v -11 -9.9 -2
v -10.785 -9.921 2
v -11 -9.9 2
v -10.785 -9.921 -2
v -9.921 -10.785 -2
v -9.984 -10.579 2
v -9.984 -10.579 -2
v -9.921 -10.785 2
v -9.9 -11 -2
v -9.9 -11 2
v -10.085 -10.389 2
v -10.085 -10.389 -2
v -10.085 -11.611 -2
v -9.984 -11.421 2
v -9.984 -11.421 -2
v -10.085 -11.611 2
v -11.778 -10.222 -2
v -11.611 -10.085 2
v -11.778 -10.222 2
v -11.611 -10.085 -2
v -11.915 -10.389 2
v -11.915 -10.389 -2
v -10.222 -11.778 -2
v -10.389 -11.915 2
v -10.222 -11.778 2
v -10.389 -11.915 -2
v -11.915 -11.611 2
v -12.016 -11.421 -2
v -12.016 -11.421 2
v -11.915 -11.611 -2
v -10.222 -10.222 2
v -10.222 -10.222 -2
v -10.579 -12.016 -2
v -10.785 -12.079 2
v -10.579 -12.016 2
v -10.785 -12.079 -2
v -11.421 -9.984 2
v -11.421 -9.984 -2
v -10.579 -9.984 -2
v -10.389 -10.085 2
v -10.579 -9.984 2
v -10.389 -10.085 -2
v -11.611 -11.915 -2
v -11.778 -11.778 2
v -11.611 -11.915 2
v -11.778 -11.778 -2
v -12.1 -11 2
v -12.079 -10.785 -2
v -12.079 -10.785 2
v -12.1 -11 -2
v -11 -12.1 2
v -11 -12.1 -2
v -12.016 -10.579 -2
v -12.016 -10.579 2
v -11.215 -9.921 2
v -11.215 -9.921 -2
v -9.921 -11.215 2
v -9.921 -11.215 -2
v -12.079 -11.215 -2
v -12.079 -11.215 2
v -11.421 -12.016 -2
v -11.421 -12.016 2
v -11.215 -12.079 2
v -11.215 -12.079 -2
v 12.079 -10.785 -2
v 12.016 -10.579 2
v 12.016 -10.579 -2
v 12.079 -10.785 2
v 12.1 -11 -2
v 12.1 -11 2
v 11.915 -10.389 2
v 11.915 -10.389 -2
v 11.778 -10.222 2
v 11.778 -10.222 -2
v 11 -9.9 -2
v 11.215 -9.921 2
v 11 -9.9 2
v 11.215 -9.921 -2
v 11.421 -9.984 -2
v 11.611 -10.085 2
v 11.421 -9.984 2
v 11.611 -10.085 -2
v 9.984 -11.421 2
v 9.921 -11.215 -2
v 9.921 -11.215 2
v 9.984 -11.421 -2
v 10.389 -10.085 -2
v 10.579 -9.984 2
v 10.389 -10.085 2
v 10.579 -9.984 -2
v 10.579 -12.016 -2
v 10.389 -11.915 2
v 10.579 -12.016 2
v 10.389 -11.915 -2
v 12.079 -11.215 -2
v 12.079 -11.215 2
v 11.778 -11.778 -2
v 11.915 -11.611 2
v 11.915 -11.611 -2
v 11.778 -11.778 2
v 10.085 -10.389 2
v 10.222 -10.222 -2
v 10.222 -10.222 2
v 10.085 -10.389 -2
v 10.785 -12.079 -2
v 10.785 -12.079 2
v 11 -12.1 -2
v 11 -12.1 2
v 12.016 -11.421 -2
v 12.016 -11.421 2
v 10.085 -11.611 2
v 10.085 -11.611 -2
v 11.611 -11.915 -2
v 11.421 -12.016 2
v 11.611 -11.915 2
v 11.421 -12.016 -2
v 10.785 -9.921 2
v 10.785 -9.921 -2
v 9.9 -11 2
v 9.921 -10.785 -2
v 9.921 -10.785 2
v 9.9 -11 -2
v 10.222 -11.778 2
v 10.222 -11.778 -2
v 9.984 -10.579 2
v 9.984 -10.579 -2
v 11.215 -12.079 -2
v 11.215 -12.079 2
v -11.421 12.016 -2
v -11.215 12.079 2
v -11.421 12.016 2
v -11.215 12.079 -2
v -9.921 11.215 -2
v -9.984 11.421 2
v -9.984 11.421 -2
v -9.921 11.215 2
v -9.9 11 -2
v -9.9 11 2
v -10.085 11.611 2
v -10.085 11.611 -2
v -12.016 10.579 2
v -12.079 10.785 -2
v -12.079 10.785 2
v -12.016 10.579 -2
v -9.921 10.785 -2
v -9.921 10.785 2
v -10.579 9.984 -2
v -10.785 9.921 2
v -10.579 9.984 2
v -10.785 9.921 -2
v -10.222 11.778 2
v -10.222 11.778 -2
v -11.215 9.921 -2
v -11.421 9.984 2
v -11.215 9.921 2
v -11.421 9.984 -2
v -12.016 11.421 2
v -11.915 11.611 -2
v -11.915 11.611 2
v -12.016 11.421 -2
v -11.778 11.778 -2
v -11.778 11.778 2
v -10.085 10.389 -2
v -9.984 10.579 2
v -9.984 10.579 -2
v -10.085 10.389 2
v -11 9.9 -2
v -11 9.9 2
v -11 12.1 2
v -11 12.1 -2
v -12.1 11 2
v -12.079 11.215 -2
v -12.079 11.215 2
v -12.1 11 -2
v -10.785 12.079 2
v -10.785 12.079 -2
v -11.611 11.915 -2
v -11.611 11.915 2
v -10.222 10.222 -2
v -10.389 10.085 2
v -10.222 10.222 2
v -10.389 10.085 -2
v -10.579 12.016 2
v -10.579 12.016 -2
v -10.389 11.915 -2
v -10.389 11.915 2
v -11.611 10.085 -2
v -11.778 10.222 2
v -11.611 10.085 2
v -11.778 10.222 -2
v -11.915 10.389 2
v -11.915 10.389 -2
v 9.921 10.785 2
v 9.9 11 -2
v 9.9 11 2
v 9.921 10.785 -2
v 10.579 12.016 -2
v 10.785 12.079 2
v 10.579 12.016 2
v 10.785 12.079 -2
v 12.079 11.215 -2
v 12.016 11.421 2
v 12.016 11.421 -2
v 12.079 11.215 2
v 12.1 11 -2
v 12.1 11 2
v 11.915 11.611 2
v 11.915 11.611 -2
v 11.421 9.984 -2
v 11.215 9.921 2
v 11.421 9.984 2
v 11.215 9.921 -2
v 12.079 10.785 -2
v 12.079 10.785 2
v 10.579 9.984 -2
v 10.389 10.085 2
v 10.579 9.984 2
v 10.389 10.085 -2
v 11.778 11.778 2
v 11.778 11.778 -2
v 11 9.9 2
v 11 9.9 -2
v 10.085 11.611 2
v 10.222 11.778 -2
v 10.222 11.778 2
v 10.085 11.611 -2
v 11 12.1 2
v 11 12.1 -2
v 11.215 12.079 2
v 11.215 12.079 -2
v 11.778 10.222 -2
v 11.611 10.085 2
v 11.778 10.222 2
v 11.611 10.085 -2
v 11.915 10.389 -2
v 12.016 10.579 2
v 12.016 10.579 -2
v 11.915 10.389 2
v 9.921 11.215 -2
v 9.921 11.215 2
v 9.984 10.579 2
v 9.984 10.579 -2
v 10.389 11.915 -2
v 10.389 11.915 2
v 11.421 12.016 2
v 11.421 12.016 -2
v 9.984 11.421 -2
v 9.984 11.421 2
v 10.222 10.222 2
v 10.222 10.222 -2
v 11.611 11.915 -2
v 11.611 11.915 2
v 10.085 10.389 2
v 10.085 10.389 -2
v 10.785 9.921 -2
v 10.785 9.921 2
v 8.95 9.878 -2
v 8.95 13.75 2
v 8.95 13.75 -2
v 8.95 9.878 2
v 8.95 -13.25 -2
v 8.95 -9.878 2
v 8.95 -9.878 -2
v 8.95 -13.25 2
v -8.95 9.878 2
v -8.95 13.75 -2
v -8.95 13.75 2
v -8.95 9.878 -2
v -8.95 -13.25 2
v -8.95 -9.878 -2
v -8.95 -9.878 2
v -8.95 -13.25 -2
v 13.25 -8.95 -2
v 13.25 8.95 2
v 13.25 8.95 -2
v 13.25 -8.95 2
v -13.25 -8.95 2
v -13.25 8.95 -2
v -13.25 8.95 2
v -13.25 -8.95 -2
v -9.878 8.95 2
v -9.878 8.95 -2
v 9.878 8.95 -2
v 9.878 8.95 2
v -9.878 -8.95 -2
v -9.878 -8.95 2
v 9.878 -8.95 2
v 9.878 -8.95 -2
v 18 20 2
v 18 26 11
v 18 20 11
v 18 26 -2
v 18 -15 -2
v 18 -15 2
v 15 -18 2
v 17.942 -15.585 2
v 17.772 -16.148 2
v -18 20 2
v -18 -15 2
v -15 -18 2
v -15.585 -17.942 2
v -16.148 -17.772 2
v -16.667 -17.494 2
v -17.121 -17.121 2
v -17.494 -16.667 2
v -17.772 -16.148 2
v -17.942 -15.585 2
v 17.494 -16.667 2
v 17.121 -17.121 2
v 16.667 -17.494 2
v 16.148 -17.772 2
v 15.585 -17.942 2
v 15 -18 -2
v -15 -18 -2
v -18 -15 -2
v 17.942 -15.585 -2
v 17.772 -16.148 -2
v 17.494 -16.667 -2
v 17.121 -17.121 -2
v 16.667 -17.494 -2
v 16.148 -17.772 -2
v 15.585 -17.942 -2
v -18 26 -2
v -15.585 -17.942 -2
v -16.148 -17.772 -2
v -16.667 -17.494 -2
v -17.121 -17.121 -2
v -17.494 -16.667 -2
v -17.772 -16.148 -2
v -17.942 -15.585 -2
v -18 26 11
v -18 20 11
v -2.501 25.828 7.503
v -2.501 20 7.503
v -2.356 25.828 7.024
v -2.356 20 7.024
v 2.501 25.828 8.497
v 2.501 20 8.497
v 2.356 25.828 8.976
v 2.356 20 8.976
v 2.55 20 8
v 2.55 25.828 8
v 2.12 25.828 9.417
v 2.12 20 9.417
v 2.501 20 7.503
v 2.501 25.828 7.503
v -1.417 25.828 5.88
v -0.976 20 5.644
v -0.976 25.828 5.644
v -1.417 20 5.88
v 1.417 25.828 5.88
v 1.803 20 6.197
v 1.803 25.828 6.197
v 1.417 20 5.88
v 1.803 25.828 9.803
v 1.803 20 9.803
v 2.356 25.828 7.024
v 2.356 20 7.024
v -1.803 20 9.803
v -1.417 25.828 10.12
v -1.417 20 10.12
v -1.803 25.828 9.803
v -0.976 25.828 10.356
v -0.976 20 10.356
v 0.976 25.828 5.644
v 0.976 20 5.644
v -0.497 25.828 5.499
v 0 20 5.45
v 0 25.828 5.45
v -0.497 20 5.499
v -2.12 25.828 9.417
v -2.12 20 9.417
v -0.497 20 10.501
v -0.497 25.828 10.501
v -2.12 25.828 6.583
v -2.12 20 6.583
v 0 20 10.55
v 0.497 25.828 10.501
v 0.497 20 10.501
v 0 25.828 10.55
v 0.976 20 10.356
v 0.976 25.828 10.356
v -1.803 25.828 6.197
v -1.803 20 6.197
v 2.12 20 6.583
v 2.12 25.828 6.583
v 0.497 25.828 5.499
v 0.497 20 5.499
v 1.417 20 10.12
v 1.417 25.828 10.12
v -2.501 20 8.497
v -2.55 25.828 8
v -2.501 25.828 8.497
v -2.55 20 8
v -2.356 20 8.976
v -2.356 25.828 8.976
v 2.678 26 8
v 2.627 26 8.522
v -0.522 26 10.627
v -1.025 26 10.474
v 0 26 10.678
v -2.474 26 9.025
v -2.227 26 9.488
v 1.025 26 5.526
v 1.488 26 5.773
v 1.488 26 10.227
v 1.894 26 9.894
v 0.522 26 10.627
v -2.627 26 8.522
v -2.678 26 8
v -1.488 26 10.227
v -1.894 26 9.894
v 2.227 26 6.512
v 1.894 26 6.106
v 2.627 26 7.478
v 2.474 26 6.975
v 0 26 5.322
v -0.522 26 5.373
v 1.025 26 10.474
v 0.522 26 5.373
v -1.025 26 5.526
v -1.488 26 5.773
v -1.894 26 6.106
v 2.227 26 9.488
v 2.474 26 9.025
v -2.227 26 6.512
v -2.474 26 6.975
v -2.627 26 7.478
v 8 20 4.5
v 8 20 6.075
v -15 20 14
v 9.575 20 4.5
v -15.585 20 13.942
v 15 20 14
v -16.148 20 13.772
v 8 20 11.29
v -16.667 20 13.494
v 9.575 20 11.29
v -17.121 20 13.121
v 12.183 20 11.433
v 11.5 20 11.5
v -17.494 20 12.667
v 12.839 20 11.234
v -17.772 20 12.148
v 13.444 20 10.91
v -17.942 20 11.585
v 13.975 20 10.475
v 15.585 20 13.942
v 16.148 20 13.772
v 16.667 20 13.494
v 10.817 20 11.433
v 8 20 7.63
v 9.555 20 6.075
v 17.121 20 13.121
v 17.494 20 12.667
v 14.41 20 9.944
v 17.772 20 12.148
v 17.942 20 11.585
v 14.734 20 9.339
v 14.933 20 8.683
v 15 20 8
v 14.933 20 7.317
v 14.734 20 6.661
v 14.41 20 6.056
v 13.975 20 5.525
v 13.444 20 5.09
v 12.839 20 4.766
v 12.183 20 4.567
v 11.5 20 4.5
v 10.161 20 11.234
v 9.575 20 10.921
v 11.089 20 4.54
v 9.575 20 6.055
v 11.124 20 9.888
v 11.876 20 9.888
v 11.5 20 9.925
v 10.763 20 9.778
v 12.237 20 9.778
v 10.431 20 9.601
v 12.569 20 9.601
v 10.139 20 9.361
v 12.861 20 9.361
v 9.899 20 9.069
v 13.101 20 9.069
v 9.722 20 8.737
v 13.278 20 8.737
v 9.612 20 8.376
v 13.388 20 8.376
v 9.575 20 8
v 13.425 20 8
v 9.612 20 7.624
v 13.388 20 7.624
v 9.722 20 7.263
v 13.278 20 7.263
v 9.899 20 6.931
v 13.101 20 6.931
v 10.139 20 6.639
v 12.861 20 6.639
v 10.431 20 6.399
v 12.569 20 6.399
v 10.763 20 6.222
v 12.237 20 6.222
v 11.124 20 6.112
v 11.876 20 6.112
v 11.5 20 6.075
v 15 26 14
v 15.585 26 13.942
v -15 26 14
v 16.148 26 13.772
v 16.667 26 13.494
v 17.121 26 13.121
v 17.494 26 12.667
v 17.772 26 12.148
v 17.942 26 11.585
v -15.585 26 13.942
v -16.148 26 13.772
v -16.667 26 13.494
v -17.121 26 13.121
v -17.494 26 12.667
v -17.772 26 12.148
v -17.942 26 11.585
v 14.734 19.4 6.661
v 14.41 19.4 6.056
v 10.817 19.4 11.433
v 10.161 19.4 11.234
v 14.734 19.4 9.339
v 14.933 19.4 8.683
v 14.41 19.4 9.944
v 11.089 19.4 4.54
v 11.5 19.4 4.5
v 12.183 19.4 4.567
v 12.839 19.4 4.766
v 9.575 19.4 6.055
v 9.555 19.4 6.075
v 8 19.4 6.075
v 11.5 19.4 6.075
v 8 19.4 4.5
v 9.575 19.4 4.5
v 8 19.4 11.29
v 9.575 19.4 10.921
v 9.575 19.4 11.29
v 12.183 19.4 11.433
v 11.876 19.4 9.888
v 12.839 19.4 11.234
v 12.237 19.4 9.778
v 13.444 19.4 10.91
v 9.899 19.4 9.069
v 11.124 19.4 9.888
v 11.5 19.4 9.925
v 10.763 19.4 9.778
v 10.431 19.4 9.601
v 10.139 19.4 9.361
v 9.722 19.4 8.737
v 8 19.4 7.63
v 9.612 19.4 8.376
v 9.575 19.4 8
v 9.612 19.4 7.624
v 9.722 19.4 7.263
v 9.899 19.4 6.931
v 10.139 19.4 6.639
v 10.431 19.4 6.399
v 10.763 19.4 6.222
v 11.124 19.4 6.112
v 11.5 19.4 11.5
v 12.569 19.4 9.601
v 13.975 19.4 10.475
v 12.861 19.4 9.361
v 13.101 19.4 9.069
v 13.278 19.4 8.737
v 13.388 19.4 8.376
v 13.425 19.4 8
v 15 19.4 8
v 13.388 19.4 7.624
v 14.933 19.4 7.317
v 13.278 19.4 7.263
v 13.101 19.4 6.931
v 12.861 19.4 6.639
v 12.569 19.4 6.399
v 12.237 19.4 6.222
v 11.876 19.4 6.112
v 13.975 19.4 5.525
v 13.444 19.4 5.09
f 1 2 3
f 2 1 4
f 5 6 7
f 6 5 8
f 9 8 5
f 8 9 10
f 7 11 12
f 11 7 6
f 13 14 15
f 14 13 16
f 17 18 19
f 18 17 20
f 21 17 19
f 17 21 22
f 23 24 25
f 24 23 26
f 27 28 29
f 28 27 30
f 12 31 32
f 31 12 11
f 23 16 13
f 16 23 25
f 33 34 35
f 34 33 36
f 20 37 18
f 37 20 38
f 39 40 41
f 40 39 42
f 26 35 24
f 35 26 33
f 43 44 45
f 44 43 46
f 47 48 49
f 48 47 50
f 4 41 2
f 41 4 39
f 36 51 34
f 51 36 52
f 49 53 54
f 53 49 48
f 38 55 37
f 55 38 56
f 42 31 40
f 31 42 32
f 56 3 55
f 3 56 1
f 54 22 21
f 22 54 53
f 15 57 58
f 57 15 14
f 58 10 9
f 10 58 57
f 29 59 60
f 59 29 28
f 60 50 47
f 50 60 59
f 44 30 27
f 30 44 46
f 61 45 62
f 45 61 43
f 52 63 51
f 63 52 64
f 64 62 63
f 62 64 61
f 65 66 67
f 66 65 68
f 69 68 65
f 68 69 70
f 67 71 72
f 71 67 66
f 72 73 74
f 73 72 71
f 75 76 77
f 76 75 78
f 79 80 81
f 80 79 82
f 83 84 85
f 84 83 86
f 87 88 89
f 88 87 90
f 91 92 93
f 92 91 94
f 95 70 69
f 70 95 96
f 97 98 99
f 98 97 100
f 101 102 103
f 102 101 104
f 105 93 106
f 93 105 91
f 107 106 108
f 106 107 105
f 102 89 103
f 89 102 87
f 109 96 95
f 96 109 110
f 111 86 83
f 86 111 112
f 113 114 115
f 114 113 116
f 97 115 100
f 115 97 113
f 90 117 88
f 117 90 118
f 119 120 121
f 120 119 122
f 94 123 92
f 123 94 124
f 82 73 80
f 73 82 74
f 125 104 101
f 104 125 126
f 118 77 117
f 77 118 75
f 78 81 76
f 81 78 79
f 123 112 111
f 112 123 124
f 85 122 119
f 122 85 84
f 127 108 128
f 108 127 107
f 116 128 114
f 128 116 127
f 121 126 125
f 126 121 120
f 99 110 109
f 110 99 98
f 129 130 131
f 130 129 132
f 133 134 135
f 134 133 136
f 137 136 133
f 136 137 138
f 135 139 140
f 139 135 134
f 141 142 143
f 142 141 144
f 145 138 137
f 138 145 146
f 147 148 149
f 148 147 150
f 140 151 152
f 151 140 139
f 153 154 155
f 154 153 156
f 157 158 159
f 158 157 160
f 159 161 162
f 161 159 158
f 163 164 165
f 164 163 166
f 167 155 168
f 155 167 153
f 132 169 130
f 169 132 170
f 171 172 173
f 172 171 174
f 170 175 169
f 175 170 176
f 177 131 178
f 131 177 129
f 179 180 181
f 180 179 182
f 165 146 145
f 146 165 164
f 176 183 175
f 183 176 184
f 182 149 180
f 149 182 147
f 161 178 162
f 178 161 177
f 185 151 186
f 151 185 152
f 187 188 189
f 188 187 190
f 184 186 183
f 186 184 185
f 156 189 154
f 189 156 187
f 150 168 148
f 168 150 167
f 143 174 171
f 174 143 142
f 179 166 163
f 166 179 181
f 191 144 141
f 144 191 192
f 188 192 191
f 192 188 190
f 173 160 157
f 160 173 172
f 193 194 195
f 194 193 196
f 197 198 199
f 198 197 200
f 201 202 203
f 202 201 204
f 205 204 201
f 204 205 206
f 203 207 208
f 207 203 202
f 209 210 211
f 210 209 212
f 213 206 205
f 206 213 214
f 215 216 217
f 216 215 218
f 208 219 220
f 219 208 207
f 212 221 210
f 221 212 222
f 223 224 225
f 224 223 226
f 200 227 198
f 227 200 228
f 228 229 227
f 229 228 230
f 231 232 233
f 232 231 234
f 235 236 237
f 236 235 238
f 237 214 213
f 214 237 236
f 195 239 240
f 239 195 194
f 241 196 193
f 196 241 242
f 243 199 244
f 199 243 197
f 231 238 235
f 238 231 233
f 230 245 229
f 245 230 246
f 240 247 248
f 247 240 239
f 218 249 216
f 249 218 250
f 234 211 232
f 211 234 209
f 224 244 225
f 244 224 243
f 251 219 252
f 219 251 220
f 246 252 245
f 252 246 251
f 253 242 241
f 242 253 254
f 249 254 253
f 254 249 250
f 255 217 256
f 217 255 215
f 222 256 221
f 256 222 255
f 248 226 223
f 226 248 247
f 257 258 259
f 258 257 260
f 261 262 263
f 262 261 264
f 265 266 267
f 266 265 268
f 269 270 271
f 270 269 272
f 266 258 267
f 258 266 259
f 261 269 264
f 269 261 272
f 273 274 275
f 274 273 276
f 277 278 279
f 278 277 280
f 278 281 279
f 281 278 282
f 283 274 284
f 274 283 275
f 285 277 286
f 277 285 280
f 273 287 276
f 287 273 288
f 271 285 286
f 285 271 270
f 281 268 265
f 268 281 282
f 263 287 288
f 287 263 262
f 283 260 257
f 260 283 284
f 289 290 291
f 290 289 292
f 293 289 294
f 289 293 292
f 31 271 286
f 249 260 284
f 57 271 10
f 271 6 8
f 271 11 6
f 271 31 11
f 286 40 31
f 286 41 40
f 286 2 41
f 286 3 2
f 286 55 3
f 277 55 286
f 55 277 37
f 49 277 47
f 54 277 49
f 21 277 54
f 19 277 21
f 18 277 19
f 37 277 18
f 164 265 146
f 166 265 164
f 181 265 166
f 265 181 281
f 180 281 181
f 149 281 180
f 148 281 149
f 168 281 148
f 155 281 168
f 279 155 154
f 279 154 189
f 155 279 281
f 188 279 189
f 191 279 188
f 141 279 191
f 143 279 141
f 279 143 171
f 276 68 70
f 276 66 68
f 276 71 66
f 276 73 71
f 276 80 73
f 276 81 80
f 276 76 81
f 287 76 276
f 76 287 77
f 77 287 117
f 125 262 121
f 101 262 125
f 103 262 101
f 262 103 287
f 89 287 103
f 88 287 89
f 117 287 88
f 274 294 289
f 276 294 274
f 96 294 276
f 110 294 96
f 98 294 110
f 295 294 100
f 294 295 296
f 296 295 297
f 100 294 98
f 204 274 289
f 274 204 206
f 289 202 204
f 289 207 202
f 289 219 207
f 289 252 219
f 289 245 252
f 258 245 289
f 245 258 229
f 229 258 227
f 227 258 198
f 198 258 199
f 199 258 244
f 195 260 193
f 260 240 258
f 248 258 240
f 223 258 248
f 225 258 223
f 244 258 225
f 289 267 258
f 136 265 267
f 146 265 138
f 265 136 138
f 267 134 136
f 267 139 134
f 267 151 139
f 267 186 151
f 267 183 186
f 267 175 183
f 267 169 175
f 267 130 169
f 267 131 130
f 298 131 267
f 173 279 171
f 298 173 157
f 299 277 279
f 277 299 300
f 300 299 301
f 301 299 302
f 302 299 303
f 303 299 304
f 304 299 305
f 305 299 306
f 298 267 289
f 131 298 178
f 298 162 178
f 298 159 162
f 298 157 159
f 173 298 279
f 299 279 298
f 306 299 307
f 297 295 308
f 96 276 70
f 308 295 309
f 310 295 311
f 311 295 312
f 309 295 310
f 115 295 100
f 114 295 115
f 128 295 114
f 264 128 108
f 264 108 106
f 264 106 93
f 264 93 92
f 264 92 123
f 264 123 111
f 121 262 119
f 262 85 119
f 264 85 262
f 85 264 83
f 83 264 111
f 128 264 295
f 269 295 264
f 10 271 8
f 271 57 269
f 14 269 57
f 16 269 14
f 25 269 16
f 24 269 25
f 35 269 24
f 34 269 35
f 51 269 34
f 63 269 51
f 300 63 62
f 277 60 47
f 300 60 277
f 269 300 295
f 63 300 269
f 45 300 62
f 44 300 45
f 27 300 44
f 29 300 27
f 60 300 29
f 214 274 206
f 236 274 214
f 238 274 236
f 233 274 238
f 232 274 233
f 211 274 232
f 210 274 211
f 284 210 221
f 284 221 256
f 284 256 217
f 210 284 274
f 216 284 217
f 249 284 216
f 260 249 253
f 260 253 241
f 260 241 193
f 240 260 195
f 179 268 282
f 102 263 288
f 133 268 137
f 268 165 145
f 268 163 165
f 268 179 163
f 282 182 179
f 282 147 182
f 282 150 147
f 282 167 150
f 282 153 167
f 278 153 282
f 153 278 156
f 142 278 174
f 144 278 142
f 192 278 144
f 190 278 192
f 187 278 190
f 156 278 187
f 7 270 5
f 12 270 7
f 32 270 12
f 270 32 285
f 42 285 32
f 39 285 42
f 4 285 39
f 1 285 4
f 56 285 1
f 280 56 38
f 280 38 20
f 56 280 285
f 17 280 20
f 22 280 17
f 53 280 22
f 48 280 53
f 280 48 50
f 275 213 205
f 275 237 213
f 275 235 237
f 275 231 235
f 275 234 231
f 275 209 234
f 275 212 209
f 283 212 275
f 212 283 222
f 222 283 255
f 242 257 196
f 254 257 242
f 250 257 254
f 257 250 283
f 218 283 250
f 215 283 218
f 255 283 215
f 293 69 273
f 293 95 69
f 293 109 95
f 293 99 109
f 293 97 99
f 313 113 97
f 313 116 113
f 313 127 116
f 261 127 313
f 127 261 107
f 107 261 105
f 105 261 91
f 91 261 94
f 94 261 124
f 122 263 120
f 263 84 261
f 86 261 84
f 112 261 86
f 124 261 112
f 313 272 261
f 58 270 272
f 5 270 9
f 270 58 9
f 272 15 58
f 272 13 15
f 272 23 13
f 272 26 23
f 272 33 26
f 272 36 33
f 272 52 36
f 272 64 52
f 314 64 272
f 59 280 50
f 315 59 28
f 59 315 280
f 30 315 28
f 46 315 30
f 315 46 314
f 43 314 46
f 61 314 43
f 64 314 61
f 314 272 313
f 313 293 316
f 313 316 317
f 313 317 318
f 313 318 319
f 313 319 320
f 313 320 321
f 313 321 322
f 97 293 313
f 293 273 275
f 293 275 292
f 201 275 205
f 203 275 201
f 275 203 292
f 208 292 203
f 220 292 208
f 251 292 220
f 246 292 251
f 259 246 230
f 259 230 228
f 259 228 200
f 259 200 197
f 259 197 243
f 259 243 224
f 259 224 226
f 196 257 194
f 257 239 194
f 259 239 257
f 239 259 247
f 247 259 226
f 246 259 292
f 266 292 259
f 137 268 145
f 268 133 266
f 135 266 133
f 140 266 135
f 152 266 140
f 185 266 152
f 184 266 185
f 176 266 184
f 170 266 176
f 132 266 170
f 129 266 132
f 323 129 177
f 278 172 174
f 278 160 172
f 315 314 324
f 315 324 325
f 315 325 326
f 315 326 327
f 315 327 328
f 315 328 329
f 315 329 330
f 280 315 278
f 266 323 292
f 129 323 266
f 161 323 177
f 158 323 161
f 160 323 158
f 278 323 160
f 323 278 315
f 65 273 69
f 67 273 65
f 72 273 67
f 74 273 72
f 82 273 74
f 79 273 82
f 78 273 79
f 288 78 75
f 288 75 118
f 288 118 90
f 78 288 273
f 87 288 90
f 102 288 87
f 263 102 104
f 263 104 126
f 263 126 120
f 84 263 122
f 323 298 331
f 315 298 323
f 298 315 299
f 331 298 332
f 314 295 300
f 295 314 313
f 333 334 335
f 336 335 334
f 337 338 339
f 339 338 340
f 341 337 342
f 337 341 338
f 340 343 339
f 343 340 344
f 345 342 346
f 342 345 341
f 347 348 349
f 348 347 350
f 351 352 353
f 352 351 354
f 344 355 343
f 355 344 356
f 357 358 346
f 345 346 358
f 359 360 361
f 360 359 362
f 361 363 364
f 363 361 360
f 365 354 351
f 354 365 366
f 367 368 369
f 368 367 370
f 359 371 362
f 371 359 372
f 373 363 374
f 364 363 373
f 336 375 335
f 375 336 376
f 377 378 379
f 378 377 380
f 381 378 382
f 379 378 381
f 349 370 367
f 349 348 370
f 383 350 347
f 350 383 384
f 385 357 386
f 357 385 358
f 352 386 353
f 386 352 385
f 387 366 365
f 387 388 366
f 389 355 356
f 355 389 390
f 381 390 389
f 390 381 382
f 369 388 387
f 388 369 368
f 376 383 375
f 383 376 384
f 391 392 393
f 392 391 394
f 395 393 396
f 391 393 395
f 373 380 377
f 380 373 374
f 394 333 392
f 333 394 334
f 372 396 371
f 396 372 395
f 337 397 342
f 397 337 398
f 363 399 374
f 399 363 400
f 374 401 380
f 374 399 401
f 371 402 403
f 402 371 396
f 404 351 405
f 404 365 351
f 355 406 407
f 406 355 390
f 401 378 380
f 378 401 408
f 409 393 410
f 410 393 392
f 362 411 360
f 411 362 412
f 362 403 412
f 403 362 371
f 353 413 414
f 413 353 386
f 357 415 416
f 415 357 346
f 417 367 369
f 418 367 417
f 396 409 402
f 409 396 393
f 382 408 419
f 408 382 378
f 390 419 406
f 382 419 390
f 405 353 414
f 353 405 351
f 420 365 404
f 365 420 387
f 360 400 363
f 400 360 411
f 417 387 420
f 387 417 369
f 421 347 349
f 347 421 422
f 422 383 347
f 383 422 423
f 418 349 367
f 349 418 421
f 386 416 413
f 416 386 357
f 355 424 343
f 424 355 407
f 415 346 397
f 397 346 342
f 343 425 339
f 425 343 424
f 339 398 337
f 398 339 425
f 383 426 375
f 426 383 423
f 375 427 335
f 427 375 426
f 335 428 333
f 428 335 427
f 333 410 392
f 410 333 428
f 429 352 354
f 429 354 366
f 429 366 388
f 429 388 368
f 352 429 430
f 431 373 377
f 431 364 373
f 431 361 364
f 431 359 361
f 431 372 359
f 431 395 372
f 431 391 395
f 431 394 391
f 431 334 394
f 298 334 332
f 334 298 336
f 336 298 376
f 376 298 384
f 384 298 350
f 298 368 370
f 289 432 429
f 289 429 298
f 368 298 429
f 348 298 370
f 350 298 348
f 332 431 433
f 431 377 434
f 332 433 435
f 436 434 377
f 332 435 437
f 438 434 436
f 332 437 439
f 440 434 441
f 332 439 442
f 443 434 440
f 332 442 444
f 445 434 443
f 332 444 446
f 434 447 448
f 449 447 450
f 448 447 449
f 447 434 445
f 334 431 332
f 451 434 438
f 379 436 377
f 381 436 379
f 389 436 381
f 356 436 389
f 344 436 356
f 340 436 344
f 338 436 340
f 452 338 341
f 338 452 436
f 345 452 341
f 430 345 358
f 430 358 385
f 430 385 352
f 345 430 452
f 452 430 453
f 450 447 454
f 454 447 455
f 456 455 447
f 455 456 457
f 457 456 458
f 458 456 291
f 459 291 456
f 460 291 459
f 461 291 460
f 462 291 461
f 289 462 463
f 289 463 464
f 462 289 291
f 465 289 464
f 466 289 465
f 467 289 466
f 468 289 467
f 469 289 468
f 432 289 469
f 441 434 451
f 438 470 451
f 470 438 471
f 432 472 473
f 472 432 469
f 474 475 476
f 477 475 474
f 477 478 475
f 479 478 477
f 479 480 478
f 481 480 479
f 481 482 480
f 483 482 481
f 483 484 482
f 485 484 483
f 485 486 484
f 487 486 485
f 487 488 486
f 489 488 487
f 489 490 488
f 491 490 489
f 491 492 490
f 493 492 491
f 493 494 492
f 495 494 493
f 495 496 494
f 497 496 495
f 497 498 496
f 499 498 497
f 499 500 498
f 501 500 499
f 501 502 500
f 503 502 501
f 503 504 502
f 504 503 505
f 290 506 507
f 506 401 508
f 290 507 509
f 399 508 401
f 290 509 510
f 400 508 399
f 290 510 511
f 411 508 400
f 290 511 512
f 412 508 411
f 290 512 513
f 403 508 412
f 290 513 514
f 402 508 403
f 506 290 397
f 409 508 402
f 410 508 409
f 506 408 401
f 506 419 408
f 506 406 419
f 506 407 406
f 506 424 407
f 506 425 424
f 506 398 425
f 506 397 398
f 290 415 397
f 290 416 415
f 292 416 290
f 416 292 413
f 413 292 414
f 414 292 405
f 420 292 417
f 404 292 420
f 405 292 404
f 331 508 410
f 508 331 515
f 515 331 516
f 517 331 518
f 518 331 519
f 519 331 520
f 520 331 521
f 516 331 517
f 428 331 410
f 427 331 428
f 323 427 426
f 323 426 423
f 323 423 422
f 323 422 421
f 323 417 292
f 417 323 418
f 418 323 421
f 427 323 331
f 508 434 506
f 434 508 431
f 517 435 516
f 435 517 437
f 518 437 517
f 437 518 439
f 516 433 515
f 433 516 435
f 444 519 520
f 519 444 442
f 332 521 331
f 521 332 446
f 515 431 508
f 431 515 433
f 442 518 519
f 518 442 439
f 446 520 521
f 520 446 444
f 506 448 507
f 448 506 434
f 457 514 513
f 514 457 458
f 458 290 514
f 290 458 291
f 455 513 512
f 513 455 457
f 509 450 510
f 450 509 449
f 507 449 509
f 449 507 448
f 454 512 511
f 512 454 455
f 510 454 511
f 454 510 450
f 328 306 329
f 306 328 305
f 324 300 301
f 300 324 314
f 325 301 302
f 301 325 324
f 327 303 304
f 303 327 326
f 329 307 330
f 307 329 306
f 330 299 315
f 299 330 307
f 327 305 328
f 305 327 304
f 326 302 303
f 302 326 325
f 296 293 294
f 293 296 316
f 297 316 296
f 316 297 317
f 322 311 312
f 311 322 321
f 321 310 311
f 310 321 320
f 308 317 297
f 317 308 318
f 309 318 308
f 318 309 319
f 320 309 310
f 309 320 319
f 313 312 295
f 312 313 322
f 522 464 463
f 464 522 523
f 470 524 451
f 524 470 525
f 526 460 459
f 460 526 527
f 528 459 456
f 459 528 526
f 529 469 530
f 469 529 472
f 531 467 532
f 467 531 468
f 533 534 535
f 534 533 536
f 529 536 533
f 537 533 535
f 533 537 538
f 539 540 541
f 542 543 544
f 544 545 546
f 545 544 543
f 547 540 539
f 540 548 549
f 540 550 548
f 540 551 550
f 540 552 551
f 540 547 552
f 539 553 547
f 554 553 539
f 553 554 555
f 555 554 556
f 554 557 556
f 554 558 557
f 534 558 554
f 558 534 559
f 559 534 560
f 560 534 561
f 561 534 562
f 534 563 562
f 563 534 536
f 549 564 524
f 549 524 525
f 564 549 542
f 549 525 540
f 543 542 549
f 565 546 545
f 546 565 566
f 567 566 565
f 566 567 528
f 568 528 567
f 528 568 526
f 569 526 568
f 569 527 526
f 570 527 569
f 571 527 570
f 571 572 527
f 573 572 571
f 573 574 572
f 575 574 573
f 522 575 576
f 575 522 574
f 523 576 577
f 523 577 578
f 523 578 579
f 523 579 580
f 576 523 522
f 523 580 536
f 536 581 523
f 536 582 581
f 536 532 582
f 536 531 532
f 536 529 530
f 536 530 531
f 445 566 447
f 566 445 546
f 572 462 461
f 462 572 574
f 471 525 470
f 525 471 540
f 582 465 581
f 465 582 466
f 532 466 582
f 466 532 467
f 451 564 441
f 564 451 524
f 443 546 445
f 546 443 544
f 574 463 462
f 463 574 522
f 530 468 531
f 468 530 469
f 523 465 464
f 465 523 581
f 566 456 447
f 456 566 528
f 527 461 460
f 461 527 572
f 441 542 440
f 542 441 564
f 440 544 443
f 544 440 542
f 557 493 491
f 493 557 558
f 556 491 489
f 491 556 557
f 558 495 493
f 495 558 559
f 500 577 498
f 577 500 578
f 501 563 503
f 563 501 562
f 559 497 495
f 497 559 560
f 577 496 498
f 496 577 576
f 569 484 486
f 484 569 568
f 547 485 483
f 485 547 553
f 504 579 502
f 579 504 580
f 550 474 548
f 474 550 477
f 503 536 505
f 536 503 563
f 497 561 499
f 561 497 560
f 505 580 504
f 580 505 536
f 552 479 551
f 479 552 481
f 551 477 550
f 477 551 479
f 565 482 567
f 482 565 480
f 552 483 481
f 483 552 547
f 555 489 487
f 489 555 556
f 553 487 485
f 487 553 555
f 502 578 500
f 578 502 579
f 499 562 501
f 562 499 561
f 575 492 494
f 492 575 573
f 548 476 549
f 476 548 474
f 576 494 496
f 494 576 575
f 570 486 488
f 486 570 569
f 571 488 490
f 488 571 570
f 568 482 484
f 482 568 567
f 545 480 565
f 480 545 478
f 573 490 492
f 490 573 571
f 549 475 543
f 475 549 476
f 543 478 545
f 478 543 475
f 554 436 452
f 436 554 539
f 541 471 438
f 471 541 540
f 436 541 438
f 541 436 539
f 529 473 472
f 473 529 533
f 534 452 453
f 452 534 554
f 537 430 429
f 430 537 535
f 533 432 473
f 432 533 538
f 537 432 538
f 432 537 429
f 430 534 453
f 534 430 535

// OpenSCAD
width = 36;
height = 36;
depth = 4;

base_height = 16;
base_depth = 6;

tripod_hole_diameter = 5.1;     // Diameter of the tripod mounting hole

module camera_module_cutout(depth) {
    module_size = 26.5;
    hole_diameter = 2.20;     // Diameter of the mounting holes
    pad_diameter = 4.3;
    hole_spacing = 22;
    bottom_clearance = 0.5;

    offset = hole_spacing / 2;

    translate([-offset, -offset, 0])
        cylinder(h = depth + 4, d = hole_diameter, center = true, $fn = 32);

    translate([offset, -offset, 0])
        cylinder(h = depth + 4, d = hole_diameter, center = true, $fn = 32);

    translate([-offset, offset, 0])
        cylinder(h = depth + 4, d = hole_diameter, center = true, $fn = 32);

    translate([offset, offset, 0])
        cylinder(h = depth + 4, d = hole_diameter, center = true, $fn = 32);

    translate ([0,bottom_clearance/2,0])
        cube([module_size - 2 * pad_diameter, module_size+bottom_clearance, depth + 4], center = true);
    
    cube([module_size, module_size - 2 * pad_diameter, depth + 4], center = true);

    // Chamfers
    chamfer_size = 4;

    translate([-8,-8,0])
        rotate([0,0,45])
            cube([chamfer_size, chamfer_size, depth + 4], center = true);

    translate([-8,8,0])
        rotate([0,0,45])
            cube([chamfer_size, chamfer_size, depth + 4], center = true);

    translate([8,-8,0])
        rotate([0,0,45])
            cube([chamfer_size, chamfer_size, depth + 4], center = true);

    translate([8,8,0])
        rotate([0,0,45])
            cube([chamfer_size, chamfer_size, depth + 4], center = true);
}


module chamfer(radius, depth) {
    cylinder(h = depth, d = 2 * radius, center = true, $fn = 32);
}


module base() {
    chamfer_radius = 3;

    union(){
        difference(){
            cube([width, base_height, base_depth], center = true);

            translate([0, depth / 2, 0]){
                cylinder(h = height + 2, d = tripod_hole_diameter, center = true, $fn = 32);

                translate([0, 0, -(base_depth / 2) - 0.5])
                    cylinder(h = tripod_hole_diameter - 1, d1 = tripod_hole_diameter + 1, d2 = 0, center = false, $fn = 32);
            }

            // Chamfer cut-outs
            translate([0, base_height / 2, 0]){
                translate([-width / 2, 0,0])
                    chamfer(chamfer_radius, base_depth + 1);
                translate([width / 2, 0,0])
                    chamfer(chamfer_radius, base_depth + 1);                
            }
        }

        // Chamfers
        translate([0, base_height / 2 - chamfer_radius, 0]){
            translate([-width / 2 + chamfer_radius, 0,0])
                chamfer(chamfer_radius, base_depth);
            translate([width / 2 - chamfer_radius, 0,0])
                chamfer(chamfer_radius, base_depth);
        }
    }
}


module logo(diameter, height){
    union(){
        diameter_inner = diameter * 0.55;
        width = (diameter - diameter_inner) / 2;

        difference(){
            union(){
                
                difference(){
                    cylinder(h = height, d = diameter, center = true, $fn = 32);
                    cylinder(h = height + 1, d = diameter_inner, center = true, $fn = 32);
                }

                translate([(diameter_inner + width) / 2, 0, 0])
                    cube([width, diameter * 0.94, height], center = true);
            }

            offset = (diameter * 1.26) / 2;
            translate([offset, offset, 0])
                rotate([0,0,45])
                    cube([diameter, diameter, height + 1], center = true);
        }

        translate([(diameter_inner + width) / 2, (diameter_inner + width) / 2, 0])
            cube([width, width, height], center = true);
    }
}


module main(){
    union(){
        chamfer_radius = 3;

        difference(){
            cube([width, height, depth], center = true);
            camera_module_cutout(depth);

            // Chamfer cut-outs
            translate([0, -width / 2, 0]){
                translate([-width / 2, 0,0])
                    chamfer(chamfer_radius, depth + 1);
                translate([width / 2, 0,0])
                    chamfer(chamfer_radius, depth + 1);                
            }        
        }

        spacer_height = 4;

        translate([0, (height + spacer_height) / 2, 0])
            cube([width, spacer_height, depth], center = true);

        translate([0, (height + base_depth + spacer_height) / 2, (base_height - depth) / 2])
            rotate([90,0,0])
                base();

        // Chamfers
        translate([0, -width / 2 + chamfer_radius, 0]){
            translate([-width / 2 + chamfer_radius, 0,0])
                chamfer(chamfer_radius, depth);
            translate([width / 2 - chamfer_radius, 0,0])
                chamfer(chamfer_radius, depth);
        }

        logo_diameter = 7;
        logo_x_offset = (width - logo_diameter) / 2;
        logo_y_offset = (height + spacer_height) / 2;
        logo_z_offset = (base_height - depth) / 2 + depth / 2;

        translate([logo_x_offset - 3, logo_y_offset, logo_z_offset])
            rotate([90,180,00])
                logo(logo_diameter, 1.2);
    }
}

main();
